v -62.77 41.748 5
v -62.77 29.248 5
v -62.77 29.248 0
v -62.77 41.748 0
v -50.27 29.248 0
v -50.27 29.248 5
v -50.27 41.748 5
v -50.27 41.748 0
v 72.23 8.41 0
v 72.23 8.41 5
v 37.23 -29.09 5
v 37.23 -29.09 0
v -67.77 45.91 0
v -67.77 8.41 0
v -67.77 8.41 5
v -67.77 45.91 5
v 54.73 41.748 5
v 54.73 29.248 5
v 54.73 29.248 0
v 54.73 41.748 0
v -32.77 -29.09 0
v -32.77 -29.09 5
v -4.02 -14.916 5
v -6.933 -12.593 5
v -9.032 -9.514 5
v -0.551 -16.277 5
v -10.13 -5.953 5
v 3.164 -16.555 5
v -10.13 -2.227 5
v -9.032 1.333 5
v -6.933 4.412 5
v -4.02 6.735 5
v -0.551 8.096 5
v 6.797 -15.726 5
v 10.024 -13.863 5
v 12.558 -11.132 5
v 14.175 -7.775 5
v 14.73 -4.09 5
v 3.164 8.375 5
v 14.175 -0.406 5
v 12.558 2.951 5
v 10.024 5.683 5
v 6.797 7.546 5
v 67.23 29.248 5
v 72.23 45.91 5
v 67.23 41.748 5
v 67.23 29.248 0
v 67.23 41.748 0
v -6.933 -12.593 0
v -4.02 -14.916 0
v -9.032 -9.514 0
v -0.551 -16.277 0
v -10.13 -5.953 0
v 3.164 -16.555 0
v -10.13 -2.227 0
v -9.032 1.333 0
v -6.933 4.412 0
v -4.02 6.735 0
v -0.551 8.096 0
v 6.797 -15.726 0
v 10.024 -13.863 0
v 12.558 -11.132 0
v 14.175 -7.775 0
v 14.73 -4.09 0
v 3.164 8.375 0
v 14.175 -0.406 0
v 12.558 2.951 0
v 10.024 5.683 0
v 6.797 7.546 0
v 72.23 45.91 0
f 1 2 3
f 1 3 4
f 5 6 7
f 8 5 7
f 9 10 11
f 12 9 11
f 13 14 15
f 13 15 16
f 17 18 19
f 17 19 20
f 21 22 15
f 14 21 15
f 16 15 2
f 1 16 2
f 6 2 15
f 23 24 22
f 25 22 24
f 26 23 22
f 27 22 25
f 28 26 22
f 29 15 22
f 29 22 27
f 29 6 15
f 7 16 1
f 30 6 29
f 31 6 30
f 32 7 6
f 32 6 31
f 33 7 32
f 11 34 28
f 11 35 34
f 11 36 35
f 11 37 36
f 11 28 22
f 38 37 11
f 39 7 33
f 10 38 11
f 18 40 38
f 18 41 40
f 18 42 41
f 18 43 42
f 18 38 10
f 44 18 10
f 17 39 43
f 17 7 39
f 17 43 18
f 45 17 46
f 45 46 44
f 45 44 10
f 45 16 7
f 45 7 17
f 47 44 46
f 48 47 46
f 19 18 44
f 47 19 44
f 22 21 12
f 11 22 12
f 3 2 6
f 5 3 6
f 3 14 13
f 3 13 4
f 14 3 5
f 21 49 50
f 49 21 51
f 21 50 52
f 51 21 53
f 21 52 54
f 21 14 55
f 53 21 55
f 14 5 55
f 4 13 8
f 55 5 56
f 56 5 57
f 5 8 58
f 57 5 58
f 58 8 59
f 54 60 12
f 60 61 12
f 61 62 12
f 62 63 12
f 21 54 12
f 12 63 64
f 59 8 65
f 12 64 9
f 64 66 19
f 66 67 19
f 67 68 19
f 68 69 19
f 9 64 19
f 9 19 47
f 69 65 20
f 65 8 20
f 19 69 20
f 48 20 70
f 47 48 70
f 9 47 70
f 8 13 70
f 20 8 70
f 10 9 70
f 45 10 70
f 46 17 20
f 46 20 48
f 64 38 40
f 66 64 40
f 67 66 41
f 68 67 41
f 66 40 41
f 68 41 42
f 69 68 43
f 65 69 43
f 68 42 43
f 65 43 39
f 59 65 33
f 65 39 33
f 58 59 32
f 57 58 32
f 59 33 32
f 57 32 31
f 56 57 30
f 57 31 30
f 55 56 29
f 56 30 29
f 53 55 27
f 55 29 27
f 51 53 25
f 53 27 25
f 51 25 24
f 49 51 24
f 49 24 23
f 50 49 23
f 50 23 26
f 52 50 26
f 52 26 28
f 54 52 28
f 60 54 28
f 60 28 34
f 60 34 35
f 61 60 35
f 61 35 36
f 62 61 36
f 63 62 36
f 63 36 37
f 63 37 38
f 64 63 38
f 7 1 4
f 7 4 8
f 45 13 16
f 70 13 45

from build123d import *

# Parameters (mm, degrees)
F0_W     = 140
F0_H     = 75
F1_DEPTH = 5
F2_W     = 12.5
F2_H     = 12.5
F3_DEPTH = 25
F4_R     = 12.5
F5_DEPTH = 25
F7_DEPTH = 25


with BuildPart() as f1:
    # F0 (on Top) → F1 (new body)
    with BuildSketch(Plane.XY):
        with Locations((2.230102, 8.409632)):
            Rectangle(F0_W, F0_H)
    extrude(amount=F1_DEPTH)

    # F2 (on face) → F3 (cut)
    with BuildSketch(Plane.XY.offset(5)):
        with Locations((-56.519898, 35.497632)):
            Rectangle(F2_W, F2_H)
        with Locations((60.980102, 35.497632)):
            Rectangle(F2_W, F2_H)
    extrude(amount=-F3_DEPTH, mode=Mode.SUBTRACT)

    # F4 (on face) → F5 (cut)
    with BuildSketch(Plane.XY.offset(5)):
        with Locations((2.230102, -4.090368)):
            Circle(F4_R)
    extrude(amount=-F5_DEPTH, mode=Mode.SUBTRACT)

    # F6 (on face) → F7 (cut)
    with BuildSketch(Plane.XY.offset(5)):
        Polygon((-32.769898, -29.090368), (-67.769898, 8.409632), (-67.769898, -29.090368), align=None)
        Polygon((72.230102, -29.090368), (72.230102, 8.409632), (37.230102, -29.090368), align=None)
    extrude(amount=-F7_DEPTH, mode=Mode.SUBTRACT)


solid = f1.part
